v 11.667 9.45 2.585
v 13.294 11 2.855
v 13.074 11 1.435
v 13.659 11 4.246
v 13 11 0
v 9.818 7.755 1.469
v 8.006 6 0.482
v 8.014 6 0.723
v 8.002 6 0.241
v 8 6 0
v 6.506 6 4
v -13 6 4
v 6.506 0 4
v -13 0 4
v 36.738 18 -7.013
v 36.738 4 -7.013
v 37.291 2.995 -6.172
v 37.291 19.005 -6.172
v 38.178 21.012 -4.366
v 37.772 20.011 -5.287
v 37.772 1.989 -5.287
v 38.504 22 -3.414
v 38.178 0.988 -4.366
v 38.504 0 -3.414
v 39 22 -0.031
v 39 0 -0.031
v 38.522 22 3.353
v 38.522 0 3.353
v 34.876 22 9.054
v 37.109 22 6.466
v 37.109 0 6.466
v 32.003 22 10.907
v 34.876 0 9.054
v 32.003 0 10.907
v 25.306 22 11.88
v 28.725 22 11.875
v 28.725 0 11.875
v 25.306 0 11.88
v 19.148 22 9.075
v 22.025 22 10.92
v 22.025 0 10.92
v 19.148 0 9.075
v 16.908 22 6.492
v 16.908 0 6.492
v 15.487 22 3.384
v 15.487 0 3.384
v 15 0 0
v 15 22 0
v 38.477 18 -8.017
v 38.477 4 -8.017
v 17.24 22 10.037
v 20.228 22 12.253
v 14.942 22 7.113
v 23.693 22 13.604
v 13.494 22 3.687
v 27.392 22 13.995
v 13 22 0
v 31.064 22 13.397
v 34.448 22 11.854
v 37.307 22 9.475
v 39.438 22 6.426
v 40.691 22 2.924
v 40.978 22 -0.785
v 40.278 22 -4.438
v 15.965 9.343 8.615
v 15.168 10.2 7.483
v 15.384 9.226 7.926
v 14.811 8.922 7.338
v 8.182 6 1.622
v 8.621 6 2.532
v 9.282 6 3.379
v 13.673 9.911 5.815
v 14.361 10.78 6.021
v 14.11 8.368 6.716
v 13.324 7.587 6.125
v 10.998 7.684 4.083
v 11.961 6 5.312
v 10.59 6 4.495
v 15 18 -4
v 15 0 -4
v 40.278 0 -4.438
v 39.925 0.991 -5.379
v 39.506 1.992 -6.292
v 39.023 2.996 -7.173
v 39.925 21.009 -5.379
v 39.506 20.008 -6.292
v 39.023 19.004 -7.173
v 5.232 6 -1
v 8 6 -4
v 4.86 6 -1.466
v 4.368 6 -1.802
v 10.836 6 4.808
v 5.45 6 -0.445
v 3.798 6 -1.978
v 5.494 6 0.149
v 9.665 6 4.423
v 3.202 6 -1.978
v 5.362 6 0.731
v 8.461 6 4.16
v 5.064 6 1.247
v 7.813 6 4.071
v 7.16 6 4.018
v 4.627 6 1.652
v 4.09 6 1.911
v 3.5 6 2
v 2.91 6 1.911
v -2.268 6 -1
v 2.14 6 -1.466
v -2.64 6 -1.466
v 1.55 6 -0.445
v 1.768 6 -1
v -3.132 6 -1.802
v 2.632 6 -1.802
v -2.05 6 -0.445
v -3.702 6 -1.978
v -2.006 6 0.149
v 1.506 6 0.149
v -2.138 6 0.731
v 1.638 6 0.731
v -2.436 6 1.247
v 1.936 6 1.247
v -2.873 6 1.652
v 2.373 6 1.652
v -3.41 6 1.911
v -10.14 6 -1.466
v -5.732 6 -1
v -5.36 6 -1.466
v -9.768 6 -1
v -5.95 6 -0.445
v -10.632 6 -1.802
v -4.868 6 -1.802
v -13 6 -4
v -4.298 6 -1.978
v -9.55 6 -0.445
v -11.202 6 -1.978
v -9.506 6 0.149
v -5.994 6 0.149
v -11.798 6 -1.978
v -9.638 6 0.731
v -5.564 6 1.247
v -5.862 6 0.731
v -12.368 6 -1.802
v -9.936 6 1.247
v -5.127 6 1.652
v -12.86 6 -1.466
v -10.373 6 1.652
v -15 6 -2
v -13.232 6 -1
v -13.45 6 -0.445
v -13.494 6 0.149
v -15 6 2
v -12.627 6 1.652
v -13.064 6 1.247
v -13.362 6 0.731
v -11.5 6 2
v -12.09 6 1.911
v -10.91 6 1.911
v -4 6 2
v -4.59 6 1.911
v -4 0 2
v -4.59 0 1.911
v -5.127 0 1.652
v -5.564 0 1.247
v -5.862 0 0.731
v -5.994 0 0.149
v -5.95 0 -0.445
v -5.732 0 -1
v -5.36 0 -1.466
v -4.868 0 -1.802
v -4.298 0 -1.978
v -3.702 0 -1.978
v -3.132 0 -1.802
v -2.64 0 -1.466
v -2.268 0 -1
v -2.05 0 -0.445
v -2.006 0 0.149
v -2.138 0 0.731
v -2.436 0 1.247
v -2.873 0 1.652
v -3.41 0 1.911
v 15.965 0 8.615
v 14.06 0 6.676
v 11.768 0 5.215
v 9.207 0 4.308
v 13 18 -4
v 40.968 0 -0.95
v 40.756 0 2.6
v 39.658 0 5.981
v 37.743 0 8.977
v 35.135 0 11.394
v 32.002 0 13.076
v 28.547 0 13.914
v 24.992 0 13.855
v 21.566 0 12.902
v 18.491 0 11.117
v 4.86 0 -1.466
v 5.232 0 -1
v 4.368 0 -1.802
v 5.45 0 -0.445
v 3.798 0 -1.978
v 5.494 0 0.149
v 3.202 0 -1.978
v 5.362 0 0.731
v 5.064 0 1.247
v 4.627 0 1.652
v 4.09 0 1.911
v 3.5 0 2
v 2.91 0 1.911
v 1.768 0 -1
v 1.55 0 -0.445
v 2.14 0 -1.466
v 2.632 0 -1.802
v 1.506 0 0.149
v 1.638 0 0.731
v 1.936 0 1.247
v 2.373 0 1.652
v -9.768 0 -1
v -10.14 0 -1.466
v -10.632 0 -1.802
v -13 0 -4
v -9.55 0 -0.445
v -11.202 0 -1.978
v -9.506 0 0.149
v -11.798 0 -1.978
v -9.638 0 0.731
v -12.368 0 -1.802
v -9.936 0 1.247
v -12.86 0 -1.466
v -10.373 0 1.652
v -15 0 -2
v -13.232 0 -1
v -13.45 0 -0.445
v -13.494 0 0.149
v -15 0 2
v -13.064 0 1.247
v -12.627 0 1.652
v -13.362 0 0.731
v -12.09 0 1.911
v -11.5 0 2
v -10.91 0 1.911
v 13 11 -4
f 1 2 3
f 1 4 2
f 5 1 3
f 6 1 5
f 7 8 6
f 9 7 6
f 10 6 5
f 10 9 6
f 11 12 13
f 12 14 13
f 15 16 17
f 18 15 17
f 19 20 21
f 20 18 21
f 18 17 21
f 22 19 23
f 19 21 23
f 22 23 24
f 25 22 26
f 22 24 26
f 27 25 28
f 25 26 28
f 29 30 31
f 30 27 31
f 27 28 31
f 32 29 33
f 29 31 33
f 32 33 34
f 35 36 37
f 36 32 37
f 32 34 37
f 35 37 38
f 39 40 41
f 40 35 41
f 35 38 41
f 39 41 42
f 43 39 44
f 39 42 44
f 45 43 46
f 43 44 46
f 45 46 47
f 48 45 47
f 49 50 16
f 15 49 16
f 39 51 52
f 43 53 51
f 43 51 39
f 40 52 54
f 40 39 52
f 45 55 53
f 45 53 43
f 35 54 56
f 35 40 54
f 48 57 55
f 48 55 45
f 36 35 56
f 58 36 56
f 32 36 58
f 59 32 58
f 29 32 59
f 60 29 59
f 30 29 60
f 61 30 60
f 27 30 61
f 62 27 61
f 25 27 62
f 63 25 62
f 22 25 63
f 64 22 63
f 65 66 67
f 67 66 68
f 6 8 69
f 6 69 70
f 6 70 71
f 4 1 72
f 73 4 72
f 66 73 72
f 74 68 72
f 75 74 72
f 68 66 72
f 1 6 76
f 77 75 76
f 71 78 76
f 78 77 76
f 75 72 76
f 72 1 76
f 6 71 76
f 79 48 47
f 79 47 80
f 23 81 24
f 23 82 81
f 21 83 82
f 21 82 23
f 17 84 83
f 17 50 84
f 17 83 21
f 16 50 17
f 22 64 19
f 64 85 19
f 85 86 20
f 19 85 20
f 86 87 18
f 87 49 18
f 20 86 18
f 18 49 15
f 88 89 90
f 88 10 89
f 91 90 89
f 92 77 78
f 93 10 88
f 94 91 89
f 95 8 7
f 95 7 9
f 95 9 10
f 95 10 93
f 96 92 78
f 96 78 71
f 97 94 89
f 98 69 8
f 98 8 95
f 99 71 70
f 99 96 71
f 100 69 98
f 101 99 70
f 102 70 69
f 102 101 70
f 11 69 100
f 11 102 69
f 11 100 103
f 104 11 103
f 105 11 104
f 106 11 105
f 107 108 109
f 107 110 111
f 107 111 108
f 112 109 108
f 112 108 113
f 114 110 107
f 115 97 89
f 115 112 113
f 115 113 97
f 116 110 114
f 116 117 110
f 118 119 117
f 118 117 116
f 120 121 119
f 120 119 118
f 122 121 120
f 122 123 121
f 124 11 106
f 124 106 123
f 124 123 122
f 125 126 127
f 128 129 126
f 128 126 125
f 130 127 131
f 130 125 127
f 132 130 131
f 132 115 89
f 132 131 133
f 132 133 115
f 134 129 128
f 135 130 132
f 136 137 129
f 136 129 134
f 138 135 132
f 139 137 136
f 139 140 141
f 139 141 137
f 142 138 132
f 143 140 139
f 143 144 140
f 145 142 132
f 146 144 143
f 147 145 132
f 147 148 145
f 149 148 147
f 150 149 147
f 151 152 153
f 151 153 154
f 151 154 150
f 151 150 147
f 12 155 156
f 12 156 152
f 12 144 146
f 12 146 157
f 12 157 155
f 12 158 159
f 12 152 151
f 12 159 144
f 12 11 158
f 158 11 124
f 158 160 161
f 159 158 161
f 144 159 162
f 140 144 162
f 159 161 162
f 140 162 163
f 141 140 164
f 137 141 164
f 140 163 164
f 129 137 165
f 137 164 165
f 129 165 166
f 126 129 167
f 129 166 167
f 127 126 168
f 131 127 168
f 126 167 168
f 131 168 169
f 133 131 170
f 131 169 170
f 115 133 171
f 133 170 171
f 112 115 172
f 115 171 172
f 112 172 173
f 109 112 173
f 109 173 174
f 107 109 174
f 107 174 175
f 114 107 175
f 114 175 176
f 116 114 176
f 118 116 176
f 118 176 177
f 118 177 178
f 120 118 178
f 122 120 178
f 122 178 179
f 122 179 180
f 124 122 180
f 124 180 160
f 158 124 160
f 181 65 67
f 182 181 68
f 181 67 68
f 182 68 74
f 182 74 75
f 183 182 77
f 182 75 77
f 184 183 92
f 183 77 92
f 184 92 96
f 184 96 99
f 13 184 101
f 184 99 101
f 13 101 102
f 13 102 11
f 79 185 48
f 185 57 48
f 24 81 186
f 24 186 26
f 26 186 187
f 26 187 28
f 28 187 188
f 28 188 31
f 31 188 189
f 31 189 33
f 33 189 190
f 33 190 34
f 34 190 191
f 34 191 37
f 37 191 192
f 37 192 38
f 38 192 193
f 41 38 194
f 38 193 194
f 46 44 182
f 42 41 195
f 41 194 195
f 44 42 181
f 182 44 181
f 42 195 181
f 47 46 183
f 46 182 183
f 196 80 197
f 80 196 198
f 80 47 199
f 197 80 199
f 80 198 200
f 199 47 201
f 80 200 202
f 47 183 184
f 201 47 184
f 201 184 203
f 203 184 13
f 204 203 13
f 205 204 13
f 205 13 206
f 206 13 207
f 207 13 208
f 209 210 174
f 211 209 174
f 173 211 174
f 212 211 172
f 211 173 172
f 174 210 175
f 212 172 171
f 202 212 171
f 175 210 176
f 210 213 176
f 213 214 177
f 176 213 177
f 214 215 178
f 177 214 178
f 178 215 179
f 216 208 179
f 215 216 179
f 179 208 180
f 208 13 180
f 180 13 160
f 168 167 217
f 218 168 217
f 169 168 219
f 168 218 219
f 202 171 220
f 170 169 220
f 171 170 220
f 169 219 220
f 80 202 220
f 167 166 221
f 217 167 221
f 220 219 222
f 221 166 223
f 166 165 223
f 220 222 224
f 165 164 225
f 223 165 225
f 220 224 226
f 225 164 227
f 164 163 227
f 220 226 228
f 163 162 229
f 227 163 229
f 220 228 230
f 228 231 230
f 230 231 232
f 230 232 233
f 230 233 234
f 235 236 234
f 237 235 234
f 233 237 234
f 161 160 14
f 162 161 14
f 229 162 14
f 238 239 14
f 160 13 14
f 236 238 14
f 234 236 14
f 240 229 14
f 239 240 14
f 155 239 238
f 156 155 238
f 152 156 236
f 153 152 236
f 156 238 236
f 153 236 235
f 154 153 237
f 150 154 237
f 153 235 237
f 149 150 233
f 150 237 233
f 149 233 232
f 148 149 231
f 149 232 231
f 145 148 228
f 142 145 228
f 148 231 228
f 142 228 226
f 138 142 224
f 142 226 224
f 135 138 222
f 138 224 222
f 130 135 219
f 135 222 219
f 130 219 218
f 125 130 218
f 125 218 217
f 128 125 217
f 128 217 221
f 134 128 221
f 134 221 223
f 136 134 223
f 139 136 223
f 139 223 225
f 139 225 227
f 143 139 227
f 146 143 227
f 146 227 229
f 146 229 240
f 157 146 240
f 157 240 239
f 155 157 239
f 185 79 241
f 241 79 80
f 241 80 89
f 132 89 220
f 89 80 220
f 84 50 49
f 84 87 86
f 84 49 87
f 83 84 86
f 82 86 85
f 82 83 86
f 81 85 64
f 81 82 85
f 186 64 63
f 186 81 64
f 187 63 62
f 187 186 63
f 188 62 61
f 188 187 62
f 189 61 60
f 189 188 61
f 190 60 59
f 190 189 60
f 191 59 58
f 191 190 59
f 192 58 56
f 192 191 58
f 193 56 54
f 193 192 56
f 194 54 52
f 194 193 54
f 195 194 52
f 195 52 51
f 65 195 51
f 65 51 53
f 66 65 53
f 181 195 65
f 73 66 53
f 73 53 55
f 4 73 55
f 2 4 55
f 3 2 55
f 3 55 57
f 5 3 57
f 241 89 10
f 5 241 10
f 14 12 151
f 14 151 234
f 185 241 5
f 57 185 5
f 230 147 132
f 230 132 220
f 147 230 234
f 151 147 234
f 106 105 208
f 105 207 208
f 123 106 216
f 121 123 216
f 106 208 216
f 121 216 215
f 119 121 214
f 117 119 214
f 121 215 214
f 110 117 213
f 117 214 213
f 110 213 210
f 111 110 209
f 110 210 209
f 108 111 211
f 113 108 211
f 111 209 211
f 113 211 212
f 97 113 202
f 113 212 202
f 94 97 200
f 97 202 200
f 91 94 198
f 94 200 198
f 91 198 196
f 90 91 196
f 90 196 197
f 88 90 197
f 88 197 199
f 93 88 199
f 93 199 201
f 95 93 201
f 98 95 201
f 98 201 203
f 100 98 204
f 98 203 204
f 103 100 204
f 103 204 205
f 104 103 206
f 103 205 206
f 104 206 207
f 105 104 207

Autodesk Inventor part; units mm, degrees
ref_plane "YZ Plane" through (0, 0, 0) normal (1, 0, 0) x (0, 1, 0)
ref_plane "XZ Plane" through (0, 0, 0) normal (0, 1, 0) x (-1, 0, 0)
ref_plane "XY Plane" through (0, 0, 0) normal (0, 0, 1) x (1, 0, 0)
sketch "Sketch1" plane through (0, 0, 0) normal (0, 1, 0) x (-1, 0, 0)
  line L0 (15, 4) -> (-15, 4)
  line L1 (-15, 4) -> (-15, -4)
  line L2 (-15, -4) -> (15, -4)
  line L3 (15, -4) -> (15, 4)
  line L4 (15, 4) -> (-15, -4) construction
  line L5 (-15, 4) -> (15, -4) construction
  point P0 (0, 0)
  dimension "d0" = 8
  dimension "d1" = 30
extrude "Extrusion1" add sketch "Sketch1" along normal blind 6
sketch "Sketch2" plane through (0, 6, 0) normal (0, 1, 0) x (1, 0, 0)
  line L0 (15, -4) -> (15, 4) projected
  line L1 (15, 4) -> (-15, 4) projected
  line L2 (-15, 4) -> (-15, -4) projected
  line L3 (-15, -4) -> (15, -4) projected
  point P0 (0, 0)
  point P1 (-4, 0)
  point P2 (-11.5, 0)
  point P3 (3.5, 0)
  dimension "d4" = 7.5
  dimension "d5" = 11
  dimension "d14" = 7.5
hole "Hole1" at (-4, 6, 0) at (-11.5, 6, 0) at (3.5, 6, 0) direction (0, -1, 0) diameter 4 end through all
sketch "Sketch3" plane through (0, 6, 0) normal (0, 1, 0) x (1, 0, 0)
  line L0 (15, -4) -> (15, 4) projected
  arc A0 (15, 0) -> (36.7378, 7.0126) centre (27, 0) ccw
  arc A1 (13, 0) -> (38.4773, 8.0169) centre (27, 0) ccw
  line L1 (38.4773, 8.0169) -> (36.7378, 7.0126)
  line L2 (15, 0) -> (15, 4)
  line L3 (15, 4) -> (-15, 4) projected
  line L4 (13, 4) -> (13, 0)
  point P0 (0, 0)
  dimension "d15" = 2
  dimension "d16" = 0
  dimension "d17" = 60
  dimension "d22" = 12
extrude "Extrusion2" add sketch "Sketch3" along normal blind 16 and the other way blind 6
chamfer "Chamfer1" distance 5 angle 45 2 edges at (13, 6, -2) (13.1467, 6, 2.0212)
chamfer "Chamfer2" distance 2 angle 45 2 edges at (-15, 3, 4) (-15, 3, -4)
chamfer "Chamfer3" distance 4 angle 45 3 edges at (14, 22, -4) (37.6076, 22, -7.5147) (37.6076, 0, -7.5147)
fillet "Fillet1" radius 12 1 edges at (13.5836, 3, 4)
fillet "Fillet2" radius 4 1 edges at (11.865, 8.9761, 5.2631)
properties part number "squirrely_leg"
